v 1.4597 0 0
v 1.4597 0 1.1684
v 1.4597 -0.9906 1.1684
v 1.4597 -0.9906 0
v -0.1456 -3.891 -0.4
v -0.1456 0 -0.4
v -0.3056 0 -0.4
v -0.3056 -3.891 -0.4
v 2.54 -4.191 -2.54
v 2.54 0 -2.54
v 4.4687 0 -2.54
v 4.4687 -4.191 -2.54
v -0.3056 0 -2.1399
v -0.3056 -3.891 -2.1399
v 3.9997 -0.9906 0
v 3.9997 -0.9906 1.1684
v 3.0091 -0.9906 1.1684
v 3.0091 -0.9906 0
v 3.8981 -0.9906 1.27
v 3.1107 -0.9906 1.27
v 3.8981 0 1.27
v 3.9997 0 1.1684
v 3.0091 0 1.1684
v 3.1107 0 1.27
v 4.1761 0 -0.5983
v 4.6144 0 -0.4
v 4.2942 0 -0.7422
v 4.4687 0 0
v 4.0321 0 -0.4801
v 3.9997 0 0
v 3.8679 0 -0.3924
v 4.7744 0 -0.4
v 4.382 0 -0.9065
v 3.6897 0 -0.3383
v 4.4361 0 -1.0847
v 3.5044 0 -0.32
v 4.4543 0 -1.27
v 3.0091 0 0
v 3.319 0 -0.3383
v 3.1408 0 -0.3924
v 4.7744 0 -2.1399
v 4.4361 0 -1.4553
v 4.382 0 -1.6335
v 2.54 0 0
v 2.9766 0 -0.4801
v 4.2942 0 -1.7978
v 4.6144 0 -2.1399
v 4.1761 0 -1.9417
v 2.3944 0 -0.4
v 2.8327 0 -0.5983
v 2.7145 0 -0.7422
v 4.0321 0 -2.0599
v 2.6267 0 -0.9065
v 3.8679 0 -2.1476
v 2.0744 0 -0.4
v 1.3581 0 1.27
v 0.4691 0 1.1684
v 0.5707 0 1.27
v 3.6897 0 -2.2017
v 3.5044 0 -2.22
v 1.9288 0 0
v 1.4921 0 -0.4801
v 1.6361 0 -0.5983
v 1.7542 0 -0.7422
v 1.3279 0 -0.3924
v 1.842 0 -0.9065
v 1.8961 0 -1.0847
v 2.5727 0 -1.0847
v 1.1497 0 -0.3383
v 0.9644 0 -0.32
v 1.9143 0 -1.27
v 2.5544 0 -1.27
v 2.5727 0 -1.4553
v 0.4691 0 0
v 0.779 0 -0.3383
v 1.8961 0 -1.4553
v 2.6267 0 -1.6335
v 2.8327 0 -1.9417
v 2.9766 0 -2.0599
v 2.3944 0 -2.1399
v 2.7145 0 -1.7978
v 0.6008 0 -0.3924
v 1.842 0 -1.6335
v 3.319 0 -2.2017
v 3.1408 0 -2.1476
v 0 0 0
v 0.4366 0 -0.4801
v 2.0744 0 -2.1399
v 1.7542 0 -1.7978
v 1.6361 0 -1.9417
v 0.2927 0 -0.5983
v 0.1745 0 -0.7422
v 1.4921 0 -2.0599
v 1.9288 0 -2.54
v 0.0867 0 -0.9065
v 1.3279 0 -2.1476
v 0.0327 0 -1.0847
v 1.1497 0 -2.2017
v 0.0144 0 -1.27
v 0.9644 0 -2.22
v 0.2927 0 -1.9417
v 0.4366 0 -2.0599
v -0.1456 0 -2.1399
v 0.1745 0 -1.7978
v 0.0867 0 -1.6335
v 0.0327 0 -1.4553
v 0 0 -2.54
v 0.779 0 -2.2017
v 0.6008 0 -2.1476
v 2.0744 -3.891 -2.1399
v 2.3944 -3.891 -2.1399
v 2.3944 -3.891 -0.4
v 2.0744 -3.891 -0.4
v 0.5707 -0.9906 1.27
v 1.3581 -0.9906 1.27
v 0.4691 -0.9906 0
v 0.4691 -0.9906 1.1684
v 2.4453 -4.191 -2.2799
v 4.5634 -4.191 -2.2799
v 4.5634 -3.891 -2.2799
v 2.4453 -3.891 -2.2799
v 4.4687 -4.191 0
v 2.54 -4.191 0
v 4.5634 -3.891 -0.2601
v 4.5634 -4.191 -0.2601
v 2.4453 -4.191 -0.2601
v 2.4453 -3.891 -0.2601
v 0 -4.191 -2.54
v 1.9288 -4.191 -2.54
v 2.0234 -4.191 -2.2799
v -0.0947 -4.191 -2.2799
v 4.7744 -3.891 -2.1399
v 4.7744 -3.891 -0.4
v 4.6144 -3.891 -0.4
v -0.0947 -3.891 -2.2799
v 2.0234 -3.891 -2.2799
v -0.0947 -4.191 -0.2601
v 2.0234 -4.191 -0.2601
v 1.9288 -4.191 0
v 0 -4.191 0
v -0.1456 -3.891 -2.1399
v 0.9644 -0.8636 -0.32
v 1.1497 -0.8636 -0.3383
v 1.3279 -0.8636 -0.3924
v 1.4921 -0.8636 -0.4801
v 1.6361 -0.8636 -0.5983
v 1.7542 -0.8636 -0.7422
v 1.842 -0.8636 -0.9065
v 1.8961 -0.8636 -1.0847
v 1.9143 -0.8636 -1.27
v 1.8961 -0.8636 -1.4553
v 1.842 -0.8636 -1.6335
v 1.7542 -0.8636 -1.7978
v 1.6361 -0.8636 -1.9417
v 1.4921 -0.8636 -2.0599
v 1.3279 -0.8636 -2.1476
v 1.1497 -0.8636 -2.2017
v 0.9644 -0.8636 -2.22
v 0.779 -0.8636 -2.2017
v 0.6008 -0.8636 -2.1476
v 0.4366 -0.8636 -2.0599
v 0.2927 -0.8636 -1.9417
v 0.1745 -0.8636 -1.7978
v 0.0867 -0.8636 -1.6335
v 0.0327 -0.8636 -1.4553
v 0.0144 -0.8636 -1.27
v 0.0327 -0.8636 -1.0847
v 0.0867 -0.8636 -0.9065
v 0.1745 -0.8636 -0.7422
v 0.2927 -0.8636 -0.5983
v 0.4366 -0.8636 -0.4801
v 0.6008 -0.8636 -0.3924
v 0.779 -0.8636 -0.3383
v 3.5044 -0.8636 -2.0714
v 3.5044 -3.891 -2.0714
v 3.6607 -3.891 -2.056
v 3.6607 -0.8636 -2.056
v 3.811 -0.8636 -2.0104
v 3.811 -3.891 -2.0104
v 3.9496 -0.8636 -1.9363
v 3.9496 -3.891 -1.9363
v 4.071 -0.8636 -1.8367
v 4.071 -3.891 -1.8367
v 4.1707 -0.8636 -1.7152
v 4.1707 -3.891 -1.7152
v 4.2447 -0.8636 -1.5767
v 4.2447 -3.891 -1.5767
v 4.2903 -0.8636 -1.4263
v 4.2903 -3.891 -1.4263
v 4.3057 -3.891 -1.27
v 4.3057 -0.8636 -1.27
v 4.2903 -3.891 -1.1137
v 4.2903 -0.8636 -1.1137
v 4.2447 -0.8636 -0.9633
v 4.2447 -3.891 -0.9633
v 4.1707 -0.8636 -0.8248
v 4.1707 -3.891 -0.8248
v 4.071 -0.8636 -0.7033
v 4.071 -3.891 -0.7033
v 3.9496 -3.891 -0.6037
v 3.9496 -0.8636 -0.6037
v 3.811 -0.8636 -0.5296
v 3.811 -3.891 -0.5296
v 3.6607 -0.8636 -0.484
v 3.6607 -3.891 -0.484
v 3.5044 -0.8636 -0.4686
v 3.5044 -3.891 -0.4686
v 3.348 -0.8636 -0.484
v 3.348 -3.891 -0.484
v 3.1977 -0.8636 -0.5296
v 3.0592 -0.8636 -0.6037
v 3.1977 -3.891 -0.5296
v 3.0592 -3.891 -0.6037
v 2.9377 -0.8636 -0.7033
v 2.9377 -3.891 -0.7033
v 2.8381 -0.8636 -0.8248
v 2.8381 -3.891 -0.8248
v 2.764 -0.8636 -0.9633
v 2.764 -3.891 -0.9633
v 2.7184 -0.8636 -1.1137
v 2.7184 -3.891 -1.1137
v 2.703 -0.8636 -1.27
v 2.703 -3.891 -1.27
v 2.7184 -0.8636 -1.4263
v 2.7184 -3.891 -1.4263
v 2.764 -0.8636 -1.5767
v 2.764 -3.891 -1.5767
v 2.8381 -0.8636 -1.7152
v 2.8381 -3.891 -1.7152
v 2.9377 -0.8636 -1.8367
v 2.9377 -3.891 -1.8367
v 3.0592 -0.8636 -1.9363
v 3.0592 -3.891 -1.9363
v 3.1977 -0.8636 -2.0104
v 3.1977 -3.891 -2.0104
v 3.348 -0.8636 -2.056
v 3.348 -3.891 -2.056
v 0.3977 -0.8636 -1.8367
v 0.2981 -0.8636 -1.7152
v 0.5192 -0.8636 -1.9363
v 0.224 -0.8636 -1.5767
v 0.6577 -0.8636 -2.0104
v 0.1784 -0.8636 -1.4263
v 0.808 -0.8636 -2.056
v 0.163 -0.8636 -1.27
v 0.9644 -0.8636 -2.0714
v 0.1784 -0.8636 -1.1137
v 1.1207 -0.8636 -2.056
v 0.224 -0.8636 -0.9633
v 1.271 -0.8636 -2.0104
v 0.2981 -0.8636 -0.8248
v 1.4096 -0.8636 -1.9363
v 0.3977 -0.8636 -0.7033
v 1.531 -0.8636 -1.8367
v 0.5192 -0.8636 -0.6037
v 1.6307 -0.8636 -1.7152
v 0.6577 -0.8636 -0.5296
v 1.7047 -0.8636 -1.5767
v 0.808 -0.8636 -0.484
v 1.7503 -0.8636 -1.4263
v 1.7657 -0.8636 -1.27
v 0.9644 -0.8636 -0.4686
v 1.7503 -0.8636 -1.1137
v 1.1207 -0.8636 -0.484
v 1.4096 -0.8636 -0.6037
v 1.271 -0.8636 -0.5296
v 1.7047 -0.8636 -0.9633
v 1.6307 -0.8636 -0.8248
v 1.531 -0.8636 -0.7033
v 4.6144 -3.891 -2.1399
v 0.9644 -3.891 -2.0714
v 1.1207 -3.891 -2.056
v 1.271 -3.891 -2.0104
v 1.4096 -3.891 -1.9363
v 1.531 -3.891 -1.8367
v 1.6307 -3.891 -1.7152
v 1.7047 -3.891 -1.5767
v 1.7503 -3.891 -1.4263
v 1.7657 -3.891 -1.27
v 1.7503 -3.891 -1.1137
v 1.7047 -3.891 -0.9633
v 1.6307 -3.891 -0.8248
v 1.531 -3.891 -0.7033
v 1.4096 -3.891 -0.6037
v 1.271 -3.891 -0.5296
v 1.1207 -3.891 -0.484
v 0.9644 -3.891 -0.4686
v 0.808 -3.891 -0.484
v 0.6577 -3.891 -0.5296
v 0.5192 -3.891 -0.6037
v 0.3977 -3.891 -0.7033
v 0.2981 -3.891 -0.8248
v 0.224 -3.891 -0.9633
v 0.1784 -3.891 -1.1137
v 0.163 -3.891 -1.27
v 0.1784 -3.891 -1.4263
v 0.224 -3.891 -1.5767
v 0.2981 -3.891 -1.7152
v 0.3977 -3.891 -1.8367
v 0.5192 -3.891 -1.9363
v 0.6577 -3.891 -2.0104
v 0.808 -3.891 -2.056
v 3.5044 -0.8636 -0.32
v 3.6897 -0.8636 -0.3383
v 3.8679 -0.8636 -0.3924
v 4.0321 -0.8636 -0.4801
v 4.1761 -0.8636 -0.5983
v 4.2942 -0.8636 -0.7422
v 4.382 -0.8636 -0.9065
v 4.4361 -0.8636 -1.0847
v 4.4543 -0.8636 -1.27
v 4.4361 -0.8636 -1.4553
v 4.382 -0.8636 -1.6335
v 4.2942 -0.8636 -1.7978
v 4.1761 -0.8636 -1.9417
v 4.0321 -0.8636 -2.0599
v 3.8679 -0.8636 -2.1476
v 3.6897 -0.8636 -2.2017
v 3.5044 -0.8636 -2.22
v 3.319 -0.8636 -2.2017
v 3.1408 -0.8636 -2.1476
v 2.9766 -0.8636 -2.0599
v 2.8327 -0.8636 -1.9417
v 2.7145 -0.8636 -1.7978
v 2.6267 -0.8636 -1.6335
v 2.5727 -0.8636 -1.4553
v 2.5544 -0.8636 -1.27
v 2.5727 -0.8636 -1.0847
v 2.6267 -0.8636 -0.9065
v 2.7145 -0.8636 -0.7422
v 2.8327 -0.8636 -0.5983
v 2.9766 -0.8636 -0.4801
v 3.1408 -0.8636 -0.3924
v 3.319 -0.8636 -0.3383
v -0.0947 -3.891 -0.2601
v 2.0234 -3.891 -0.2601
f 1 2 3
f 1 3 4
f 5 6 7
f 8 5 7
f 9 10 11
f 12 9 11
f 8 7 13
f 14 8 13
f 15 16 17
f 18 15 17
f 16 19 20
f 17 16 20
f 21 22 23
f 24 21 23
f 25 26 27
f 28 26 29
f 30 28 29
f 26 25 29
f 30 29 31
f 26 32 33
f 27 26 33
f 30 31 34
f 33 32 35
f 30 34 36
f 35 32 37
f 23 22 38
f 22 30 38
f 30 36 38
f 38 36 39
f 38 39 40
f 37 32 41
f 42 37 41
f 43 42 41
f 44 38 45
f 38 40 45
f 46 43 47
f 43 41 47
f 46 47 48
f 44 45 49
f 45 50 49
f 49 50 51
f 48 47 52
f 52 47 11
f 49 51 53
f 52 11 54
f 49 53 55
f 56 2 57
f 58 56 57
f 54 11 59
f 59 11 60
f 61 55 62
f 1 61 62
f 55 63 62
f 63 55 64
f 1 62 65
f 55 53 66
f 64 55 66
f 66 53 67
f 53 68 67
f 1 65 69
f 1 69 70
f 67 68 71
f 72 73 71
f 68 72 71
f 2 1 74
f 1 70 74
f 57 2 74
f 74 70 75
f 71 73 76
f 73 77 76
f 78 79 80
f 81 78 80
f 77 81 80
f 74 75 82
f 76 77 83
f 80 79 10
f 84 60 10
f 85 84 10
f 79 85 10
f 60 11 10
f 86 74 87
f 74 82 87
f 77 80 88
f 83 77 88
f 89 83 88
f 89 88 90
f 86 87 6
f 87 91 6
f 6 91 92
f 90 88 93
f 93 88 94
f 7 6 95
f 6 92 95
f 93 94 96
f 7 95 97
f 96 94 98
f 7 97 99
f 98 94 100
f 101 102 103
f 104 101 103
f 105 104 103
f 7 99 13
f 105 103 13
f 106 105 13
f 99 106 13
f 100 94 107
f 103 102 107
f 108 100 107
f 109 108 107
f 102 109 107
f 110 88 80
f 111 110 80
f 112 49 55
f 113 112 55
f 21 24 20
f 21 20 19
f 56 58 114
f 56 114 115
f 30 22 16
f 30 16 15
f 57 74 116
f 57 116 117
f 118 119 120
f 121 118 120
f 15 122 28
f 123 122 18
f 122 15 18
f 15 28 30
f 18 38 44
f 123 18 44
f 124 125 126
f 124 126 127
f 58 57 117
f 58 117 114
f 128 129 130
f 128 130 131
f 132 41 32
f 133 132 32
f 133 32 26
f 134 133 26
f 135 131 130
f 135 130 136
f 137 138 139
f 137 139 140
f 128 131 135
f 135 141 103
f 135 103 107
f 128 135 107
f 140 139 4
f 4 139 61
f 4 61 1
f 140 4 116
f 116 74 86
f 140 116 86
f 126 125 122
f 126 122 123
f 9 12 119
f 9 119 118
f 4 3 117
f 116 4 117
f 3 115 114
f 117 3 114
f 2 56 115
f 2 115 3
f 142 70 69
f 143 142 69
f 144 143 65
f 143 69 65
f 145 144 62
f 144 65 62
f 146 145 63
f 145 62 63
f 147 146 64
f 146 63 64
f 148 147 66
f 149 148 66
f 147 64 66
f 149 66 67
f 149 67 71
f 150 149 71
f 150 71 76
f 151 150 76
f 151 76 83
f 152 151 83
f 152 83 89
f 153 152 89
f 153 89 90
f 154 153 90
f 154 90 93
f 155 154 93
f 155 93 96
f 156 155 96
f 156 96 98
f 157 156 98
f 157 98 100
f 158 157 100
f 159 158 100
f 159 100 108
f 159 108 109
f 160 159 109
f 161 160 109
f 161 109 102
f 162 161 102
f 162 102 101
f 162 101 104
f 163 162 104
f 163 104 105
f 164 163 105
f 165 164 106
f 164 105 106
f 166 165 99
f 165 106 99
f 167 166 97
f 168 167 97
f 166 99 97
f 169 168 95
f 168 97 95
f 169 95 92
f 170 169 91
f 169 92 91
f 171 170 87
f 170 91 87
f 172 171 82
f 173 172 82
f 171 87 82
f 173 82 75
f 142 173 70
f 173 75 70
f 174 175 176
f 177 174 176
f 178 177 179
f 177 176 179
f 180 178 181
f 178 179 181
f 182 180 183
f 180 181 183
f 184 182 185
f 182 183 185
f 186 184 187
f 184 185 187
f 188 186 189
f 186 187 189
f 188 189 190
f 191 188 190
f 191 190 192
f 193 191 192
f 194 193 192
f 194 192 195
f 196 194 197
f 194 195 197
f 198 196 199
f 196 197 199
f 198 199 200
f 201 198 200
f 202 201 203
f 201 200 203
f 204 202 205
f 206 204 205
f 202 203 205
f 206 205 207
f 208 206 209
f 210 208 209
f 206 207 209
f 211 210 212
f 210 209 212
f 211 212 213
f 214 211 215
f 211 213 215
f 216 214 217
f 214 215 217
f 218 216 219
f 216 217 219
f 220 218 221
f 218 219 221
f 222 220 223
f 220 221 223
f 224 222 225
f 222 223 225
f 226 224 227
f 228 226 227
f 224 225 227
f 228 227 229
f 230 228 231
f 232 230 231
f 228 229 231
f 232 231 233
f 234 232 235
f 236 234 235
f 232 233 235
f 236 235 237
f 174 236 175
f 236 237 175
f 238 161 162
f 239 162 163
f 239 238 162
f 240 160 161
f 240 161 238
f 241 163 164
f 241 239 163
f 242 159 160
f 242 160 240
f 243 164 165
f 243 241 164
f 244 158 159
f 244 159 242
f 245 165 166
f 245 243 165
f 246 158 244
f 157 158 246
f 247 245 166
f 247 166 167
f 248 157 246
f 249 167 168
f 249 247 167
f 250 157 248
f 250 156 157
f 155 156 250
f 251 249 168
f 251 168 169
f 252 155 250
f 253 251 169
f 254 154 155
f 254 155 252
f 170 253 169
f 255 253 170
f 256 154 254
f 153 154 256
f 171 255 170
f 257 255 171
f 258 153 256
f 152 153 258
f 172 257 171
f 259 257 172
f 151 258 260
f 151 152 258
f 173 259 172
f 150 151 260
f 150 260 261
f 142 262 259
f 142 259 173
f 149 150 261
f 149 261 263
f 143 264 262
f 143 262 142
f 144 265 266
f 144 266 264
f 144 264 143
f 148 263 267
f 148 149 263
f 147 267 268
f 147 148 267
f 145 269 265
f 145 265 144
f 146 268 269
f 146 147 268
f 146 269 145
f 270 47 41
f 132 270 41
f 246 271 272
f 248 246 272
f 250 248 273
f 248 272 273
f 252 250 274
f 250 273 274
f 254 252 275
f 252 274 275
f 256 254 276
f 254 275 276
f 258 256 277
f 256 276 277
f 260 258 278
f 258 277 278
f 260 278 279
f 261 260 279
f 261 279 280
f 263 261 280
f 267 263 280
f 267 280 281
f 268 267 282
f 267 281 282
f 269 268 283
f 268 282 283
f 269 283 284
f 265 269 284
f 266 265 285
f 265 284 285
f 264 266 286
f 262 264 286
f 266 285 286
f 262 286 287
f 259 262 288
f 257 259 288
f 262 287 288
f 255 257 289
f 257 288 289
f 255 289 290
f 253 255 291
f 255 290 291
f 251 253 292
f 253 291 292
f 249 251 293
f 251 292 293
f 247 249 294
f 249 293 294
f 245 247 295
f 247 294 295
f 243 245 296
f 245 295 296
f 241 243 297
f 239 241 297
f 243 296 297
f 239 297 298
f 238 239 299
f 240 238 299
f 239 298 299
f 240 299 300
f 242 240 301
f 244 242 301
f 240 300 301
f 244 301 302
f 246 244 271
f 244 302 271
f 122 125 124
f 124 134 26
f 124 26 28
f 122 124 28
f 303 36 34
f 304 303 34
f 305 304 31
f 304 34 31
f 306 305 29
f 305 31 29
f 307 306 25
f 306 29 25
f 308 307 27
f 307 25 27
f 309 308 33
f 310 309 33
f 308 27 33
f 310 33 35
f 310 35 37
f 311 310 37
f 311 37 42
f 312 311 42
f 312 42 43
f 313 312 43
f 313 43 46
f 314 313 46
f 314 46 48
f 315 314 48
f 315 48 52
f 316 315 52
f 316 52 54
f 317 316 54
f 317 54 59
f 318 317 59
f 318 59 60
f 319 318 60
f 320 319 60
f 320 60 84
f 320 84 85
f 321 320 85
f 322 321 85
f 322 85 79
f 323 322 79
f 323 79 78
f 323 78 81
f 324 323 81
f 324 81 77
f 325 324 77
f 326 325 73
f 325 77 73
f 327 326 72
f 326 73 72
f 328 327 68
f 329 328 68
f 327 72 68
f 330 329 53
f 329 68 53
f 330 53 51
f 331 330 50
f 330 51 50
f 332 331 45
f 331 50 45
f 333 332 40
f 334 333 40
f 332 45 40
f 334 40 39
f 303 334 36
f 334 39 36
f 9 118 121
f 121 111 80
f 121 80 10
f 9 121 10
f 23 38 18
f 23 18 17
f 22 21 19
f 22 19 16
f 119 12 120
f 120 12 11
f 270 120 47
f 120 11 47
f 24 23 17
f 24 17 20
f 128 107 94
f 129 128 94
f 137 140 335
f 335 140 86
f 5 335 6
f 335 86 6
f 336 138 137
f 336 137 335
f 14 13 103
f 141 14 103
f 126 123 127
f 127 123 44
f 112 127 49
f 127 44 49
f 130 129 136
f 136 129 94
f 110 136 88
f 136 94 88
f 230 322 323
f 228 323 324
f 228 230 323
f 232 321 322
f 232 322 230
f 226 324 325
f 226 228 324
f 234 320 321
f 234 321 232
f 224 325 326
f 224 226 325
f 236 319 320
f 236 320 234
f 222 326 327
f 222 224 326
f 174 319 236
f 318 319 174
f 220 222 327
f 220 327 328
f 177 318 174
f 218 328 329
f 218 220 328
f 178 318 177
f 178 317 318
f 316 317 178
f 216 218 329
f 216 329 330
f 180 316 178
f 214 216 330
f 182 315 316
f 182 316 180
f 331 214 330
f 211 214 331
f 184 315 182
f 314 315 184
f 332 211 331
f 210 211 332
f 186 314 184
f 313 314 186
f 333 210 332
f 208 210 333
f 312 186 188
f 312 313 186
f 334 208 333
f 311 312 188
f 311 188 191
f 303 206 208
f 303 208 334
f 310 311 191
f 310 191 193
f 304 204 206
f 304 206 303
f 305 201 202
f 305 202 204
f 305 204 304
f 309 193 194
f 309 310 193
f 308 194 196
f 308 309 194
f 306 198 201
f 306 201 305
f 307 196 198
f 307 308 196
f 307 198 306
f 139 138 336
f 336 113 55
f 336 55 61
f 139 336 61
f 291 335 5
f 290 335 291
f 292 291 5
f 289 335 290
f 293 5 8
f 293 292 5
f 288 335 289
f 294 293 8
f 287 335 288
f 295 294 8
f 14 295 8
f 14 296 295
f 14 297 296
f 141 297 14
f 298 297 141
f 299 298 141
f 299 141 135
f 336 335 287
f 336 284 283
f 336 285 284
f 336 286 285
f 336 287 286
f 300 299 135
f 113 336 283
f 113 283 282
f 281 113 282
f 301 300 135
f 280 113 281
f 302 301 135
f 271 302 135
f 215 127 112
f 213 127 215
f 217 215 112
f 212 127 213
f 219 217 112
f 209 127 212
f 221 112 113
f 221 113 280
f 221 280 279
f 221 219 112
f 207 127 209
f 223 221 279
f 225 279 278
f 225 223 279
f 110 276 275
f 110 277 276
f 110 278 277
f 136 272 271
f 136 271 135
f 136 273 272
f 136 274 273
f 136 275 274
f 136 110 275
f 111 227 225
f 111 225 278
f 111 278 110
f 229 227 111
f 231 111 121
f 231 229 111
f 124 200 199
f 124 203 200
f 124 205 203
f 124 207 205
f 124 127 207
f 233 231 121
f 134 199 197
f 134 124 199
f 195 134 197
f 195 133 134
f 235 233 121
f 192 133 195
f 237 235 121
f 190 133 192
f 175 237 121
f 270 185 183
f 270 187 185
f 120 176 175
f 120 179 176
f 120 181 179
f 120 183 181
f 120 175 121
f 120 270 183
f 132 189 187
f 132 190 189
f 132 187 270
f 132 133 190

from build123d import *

# Parameters (mm, degrees)
EXTRUDE1_DEPTH      = 4.191
HOLE1_D             = 1.60274
HOLE1_CBORE_D       = 1.89992
HOLE1_CBORE_DEPTH   = 0.8636
EXTRUDE2_DEPTH      = 7.0104
LPATTERN1_COUNT     = 2
LPATTERN1_PITCH     = 2.54
LPATTERN2_COUNT     = 35
LPATTERN2_PITCH     = 2.54
SKETCH4_W           = 2.019808
SKETCH4_H           = 0.299974
EXTRUDE3_DEPTH      = 8.058504162
BOSS_EXTRUDE1_DEPTH = 0.9906
LPATTERN3_COUNT     = 2
LPATTERN3_PITCH     = 2.54


with BuildPart() as part:
    # Sketch1 → Extrude1 (new body)
    with BuildSketch(Plane(origin=(0, 0, 0), x_dir=(1, 0, 0), z_dir=(0, 1, 0))):
        Polygon((4.774373708, 0.40005), (4.614353708, 0.40005), (4.468747416, 0), (0, 0), (-0.145606292, 0.40005), (-0.305626292, 0.40005), (-0.305626292, 2.13995), (-0.145606292, 2.13995), (0, 2.54), (4.468747416, 2.54), (4.614353708, 2.13995), (4.774373708, 2.13995), align=None)
    extrude(amount=-EXTRUDE1_DEPTH)

    # Hole1 (through all)
    with Locations(Plane(origin=(0.964373708, 0, -1.27), x_dir=(0, 0, 1), z_dir=(0, 1, 0))):
        with Locations((0, 0)):
            hole1 = CounterBoreHole(HOLE1_D / 2, HOLE1_CBORE_D / 2, HOLE1_CBORE_DEPTH)

    # Sketch3 → Extrude2 (cut)
    with BuildSketch(Plane(origin=(0, 0, 0), x_dir=(1, 0, 0), z_dir=(0, 1, 0))):
        Polygon((1.928772816, 0), (2.5399746, 0), (2.394368308, 0.40005), (2.074379108, 0.40005), align=None)
        Polygon((2.074379108, 2.13995), (2.394368308, 2.13995), (2.5399746, 2.54), (1.928772816, 2.54), align=None)
    extrude2 = extrude(amount=-EXTRUDE2_DEPTH, mode=Mode.SUBTRACT)

    # LPattern1: Hole1 ×2
    with Locations(*[(i * LPATTERN1_PITCH, 0, 0) for i in range(1, LPATTERN1_COUNT)]):
        add(hole1, mode=Mode.SUBTRACT)

    # LPattern2: Extrude2 ×35
    with Locations(*[(i * LPATTERN2_PITCH, 0, 0) for i in range(1, LPATTERN2_COUNT)]):
        add(extrude2, mode=Mode.SUBTRACT)

    # Sketch4 → Extrude3 (cut, through all)
    with BuildSketch(Plane(origin=(4.774373708, 0, 0), x_dir=(0, 0, -1), z_dir=(1, 0, 0))):
        with Locations((1.27, -4.041013)):
            Rectangle(SKETCH4_W, SKETCH4_H)
    extrude(amount=-EXTRUDE3_DEPTH, mode=Mode.SUBTRACT)

    # Sketch5 → Boss-Extrude1 (add)
    with BuildSketch(Plane(origin=(0, 0, 0), x_dir=(-1, 0, 0), z_dir=(0, 1, 0))):
        Polygon((-0.469061008, 1.1684), (-0.570661008, 1.27), (-1.358061008, 1.27), (-1.459661008, 1.1684), (-1.459661008, 0), (-0.469061008, 0), align=None)
    boss_extrude1 = extrude(amount=-BOSS_EXTRUDE1_DEPTH)

    # LPattern3: Boss-Extrude1 ×2
    with Locations(*[(i * LPATTERN3_PITCH, 0, 0) for i in range(1, LPATTERN3_COUNT)]):
        add(boss_extrude1)


solid = part.part
